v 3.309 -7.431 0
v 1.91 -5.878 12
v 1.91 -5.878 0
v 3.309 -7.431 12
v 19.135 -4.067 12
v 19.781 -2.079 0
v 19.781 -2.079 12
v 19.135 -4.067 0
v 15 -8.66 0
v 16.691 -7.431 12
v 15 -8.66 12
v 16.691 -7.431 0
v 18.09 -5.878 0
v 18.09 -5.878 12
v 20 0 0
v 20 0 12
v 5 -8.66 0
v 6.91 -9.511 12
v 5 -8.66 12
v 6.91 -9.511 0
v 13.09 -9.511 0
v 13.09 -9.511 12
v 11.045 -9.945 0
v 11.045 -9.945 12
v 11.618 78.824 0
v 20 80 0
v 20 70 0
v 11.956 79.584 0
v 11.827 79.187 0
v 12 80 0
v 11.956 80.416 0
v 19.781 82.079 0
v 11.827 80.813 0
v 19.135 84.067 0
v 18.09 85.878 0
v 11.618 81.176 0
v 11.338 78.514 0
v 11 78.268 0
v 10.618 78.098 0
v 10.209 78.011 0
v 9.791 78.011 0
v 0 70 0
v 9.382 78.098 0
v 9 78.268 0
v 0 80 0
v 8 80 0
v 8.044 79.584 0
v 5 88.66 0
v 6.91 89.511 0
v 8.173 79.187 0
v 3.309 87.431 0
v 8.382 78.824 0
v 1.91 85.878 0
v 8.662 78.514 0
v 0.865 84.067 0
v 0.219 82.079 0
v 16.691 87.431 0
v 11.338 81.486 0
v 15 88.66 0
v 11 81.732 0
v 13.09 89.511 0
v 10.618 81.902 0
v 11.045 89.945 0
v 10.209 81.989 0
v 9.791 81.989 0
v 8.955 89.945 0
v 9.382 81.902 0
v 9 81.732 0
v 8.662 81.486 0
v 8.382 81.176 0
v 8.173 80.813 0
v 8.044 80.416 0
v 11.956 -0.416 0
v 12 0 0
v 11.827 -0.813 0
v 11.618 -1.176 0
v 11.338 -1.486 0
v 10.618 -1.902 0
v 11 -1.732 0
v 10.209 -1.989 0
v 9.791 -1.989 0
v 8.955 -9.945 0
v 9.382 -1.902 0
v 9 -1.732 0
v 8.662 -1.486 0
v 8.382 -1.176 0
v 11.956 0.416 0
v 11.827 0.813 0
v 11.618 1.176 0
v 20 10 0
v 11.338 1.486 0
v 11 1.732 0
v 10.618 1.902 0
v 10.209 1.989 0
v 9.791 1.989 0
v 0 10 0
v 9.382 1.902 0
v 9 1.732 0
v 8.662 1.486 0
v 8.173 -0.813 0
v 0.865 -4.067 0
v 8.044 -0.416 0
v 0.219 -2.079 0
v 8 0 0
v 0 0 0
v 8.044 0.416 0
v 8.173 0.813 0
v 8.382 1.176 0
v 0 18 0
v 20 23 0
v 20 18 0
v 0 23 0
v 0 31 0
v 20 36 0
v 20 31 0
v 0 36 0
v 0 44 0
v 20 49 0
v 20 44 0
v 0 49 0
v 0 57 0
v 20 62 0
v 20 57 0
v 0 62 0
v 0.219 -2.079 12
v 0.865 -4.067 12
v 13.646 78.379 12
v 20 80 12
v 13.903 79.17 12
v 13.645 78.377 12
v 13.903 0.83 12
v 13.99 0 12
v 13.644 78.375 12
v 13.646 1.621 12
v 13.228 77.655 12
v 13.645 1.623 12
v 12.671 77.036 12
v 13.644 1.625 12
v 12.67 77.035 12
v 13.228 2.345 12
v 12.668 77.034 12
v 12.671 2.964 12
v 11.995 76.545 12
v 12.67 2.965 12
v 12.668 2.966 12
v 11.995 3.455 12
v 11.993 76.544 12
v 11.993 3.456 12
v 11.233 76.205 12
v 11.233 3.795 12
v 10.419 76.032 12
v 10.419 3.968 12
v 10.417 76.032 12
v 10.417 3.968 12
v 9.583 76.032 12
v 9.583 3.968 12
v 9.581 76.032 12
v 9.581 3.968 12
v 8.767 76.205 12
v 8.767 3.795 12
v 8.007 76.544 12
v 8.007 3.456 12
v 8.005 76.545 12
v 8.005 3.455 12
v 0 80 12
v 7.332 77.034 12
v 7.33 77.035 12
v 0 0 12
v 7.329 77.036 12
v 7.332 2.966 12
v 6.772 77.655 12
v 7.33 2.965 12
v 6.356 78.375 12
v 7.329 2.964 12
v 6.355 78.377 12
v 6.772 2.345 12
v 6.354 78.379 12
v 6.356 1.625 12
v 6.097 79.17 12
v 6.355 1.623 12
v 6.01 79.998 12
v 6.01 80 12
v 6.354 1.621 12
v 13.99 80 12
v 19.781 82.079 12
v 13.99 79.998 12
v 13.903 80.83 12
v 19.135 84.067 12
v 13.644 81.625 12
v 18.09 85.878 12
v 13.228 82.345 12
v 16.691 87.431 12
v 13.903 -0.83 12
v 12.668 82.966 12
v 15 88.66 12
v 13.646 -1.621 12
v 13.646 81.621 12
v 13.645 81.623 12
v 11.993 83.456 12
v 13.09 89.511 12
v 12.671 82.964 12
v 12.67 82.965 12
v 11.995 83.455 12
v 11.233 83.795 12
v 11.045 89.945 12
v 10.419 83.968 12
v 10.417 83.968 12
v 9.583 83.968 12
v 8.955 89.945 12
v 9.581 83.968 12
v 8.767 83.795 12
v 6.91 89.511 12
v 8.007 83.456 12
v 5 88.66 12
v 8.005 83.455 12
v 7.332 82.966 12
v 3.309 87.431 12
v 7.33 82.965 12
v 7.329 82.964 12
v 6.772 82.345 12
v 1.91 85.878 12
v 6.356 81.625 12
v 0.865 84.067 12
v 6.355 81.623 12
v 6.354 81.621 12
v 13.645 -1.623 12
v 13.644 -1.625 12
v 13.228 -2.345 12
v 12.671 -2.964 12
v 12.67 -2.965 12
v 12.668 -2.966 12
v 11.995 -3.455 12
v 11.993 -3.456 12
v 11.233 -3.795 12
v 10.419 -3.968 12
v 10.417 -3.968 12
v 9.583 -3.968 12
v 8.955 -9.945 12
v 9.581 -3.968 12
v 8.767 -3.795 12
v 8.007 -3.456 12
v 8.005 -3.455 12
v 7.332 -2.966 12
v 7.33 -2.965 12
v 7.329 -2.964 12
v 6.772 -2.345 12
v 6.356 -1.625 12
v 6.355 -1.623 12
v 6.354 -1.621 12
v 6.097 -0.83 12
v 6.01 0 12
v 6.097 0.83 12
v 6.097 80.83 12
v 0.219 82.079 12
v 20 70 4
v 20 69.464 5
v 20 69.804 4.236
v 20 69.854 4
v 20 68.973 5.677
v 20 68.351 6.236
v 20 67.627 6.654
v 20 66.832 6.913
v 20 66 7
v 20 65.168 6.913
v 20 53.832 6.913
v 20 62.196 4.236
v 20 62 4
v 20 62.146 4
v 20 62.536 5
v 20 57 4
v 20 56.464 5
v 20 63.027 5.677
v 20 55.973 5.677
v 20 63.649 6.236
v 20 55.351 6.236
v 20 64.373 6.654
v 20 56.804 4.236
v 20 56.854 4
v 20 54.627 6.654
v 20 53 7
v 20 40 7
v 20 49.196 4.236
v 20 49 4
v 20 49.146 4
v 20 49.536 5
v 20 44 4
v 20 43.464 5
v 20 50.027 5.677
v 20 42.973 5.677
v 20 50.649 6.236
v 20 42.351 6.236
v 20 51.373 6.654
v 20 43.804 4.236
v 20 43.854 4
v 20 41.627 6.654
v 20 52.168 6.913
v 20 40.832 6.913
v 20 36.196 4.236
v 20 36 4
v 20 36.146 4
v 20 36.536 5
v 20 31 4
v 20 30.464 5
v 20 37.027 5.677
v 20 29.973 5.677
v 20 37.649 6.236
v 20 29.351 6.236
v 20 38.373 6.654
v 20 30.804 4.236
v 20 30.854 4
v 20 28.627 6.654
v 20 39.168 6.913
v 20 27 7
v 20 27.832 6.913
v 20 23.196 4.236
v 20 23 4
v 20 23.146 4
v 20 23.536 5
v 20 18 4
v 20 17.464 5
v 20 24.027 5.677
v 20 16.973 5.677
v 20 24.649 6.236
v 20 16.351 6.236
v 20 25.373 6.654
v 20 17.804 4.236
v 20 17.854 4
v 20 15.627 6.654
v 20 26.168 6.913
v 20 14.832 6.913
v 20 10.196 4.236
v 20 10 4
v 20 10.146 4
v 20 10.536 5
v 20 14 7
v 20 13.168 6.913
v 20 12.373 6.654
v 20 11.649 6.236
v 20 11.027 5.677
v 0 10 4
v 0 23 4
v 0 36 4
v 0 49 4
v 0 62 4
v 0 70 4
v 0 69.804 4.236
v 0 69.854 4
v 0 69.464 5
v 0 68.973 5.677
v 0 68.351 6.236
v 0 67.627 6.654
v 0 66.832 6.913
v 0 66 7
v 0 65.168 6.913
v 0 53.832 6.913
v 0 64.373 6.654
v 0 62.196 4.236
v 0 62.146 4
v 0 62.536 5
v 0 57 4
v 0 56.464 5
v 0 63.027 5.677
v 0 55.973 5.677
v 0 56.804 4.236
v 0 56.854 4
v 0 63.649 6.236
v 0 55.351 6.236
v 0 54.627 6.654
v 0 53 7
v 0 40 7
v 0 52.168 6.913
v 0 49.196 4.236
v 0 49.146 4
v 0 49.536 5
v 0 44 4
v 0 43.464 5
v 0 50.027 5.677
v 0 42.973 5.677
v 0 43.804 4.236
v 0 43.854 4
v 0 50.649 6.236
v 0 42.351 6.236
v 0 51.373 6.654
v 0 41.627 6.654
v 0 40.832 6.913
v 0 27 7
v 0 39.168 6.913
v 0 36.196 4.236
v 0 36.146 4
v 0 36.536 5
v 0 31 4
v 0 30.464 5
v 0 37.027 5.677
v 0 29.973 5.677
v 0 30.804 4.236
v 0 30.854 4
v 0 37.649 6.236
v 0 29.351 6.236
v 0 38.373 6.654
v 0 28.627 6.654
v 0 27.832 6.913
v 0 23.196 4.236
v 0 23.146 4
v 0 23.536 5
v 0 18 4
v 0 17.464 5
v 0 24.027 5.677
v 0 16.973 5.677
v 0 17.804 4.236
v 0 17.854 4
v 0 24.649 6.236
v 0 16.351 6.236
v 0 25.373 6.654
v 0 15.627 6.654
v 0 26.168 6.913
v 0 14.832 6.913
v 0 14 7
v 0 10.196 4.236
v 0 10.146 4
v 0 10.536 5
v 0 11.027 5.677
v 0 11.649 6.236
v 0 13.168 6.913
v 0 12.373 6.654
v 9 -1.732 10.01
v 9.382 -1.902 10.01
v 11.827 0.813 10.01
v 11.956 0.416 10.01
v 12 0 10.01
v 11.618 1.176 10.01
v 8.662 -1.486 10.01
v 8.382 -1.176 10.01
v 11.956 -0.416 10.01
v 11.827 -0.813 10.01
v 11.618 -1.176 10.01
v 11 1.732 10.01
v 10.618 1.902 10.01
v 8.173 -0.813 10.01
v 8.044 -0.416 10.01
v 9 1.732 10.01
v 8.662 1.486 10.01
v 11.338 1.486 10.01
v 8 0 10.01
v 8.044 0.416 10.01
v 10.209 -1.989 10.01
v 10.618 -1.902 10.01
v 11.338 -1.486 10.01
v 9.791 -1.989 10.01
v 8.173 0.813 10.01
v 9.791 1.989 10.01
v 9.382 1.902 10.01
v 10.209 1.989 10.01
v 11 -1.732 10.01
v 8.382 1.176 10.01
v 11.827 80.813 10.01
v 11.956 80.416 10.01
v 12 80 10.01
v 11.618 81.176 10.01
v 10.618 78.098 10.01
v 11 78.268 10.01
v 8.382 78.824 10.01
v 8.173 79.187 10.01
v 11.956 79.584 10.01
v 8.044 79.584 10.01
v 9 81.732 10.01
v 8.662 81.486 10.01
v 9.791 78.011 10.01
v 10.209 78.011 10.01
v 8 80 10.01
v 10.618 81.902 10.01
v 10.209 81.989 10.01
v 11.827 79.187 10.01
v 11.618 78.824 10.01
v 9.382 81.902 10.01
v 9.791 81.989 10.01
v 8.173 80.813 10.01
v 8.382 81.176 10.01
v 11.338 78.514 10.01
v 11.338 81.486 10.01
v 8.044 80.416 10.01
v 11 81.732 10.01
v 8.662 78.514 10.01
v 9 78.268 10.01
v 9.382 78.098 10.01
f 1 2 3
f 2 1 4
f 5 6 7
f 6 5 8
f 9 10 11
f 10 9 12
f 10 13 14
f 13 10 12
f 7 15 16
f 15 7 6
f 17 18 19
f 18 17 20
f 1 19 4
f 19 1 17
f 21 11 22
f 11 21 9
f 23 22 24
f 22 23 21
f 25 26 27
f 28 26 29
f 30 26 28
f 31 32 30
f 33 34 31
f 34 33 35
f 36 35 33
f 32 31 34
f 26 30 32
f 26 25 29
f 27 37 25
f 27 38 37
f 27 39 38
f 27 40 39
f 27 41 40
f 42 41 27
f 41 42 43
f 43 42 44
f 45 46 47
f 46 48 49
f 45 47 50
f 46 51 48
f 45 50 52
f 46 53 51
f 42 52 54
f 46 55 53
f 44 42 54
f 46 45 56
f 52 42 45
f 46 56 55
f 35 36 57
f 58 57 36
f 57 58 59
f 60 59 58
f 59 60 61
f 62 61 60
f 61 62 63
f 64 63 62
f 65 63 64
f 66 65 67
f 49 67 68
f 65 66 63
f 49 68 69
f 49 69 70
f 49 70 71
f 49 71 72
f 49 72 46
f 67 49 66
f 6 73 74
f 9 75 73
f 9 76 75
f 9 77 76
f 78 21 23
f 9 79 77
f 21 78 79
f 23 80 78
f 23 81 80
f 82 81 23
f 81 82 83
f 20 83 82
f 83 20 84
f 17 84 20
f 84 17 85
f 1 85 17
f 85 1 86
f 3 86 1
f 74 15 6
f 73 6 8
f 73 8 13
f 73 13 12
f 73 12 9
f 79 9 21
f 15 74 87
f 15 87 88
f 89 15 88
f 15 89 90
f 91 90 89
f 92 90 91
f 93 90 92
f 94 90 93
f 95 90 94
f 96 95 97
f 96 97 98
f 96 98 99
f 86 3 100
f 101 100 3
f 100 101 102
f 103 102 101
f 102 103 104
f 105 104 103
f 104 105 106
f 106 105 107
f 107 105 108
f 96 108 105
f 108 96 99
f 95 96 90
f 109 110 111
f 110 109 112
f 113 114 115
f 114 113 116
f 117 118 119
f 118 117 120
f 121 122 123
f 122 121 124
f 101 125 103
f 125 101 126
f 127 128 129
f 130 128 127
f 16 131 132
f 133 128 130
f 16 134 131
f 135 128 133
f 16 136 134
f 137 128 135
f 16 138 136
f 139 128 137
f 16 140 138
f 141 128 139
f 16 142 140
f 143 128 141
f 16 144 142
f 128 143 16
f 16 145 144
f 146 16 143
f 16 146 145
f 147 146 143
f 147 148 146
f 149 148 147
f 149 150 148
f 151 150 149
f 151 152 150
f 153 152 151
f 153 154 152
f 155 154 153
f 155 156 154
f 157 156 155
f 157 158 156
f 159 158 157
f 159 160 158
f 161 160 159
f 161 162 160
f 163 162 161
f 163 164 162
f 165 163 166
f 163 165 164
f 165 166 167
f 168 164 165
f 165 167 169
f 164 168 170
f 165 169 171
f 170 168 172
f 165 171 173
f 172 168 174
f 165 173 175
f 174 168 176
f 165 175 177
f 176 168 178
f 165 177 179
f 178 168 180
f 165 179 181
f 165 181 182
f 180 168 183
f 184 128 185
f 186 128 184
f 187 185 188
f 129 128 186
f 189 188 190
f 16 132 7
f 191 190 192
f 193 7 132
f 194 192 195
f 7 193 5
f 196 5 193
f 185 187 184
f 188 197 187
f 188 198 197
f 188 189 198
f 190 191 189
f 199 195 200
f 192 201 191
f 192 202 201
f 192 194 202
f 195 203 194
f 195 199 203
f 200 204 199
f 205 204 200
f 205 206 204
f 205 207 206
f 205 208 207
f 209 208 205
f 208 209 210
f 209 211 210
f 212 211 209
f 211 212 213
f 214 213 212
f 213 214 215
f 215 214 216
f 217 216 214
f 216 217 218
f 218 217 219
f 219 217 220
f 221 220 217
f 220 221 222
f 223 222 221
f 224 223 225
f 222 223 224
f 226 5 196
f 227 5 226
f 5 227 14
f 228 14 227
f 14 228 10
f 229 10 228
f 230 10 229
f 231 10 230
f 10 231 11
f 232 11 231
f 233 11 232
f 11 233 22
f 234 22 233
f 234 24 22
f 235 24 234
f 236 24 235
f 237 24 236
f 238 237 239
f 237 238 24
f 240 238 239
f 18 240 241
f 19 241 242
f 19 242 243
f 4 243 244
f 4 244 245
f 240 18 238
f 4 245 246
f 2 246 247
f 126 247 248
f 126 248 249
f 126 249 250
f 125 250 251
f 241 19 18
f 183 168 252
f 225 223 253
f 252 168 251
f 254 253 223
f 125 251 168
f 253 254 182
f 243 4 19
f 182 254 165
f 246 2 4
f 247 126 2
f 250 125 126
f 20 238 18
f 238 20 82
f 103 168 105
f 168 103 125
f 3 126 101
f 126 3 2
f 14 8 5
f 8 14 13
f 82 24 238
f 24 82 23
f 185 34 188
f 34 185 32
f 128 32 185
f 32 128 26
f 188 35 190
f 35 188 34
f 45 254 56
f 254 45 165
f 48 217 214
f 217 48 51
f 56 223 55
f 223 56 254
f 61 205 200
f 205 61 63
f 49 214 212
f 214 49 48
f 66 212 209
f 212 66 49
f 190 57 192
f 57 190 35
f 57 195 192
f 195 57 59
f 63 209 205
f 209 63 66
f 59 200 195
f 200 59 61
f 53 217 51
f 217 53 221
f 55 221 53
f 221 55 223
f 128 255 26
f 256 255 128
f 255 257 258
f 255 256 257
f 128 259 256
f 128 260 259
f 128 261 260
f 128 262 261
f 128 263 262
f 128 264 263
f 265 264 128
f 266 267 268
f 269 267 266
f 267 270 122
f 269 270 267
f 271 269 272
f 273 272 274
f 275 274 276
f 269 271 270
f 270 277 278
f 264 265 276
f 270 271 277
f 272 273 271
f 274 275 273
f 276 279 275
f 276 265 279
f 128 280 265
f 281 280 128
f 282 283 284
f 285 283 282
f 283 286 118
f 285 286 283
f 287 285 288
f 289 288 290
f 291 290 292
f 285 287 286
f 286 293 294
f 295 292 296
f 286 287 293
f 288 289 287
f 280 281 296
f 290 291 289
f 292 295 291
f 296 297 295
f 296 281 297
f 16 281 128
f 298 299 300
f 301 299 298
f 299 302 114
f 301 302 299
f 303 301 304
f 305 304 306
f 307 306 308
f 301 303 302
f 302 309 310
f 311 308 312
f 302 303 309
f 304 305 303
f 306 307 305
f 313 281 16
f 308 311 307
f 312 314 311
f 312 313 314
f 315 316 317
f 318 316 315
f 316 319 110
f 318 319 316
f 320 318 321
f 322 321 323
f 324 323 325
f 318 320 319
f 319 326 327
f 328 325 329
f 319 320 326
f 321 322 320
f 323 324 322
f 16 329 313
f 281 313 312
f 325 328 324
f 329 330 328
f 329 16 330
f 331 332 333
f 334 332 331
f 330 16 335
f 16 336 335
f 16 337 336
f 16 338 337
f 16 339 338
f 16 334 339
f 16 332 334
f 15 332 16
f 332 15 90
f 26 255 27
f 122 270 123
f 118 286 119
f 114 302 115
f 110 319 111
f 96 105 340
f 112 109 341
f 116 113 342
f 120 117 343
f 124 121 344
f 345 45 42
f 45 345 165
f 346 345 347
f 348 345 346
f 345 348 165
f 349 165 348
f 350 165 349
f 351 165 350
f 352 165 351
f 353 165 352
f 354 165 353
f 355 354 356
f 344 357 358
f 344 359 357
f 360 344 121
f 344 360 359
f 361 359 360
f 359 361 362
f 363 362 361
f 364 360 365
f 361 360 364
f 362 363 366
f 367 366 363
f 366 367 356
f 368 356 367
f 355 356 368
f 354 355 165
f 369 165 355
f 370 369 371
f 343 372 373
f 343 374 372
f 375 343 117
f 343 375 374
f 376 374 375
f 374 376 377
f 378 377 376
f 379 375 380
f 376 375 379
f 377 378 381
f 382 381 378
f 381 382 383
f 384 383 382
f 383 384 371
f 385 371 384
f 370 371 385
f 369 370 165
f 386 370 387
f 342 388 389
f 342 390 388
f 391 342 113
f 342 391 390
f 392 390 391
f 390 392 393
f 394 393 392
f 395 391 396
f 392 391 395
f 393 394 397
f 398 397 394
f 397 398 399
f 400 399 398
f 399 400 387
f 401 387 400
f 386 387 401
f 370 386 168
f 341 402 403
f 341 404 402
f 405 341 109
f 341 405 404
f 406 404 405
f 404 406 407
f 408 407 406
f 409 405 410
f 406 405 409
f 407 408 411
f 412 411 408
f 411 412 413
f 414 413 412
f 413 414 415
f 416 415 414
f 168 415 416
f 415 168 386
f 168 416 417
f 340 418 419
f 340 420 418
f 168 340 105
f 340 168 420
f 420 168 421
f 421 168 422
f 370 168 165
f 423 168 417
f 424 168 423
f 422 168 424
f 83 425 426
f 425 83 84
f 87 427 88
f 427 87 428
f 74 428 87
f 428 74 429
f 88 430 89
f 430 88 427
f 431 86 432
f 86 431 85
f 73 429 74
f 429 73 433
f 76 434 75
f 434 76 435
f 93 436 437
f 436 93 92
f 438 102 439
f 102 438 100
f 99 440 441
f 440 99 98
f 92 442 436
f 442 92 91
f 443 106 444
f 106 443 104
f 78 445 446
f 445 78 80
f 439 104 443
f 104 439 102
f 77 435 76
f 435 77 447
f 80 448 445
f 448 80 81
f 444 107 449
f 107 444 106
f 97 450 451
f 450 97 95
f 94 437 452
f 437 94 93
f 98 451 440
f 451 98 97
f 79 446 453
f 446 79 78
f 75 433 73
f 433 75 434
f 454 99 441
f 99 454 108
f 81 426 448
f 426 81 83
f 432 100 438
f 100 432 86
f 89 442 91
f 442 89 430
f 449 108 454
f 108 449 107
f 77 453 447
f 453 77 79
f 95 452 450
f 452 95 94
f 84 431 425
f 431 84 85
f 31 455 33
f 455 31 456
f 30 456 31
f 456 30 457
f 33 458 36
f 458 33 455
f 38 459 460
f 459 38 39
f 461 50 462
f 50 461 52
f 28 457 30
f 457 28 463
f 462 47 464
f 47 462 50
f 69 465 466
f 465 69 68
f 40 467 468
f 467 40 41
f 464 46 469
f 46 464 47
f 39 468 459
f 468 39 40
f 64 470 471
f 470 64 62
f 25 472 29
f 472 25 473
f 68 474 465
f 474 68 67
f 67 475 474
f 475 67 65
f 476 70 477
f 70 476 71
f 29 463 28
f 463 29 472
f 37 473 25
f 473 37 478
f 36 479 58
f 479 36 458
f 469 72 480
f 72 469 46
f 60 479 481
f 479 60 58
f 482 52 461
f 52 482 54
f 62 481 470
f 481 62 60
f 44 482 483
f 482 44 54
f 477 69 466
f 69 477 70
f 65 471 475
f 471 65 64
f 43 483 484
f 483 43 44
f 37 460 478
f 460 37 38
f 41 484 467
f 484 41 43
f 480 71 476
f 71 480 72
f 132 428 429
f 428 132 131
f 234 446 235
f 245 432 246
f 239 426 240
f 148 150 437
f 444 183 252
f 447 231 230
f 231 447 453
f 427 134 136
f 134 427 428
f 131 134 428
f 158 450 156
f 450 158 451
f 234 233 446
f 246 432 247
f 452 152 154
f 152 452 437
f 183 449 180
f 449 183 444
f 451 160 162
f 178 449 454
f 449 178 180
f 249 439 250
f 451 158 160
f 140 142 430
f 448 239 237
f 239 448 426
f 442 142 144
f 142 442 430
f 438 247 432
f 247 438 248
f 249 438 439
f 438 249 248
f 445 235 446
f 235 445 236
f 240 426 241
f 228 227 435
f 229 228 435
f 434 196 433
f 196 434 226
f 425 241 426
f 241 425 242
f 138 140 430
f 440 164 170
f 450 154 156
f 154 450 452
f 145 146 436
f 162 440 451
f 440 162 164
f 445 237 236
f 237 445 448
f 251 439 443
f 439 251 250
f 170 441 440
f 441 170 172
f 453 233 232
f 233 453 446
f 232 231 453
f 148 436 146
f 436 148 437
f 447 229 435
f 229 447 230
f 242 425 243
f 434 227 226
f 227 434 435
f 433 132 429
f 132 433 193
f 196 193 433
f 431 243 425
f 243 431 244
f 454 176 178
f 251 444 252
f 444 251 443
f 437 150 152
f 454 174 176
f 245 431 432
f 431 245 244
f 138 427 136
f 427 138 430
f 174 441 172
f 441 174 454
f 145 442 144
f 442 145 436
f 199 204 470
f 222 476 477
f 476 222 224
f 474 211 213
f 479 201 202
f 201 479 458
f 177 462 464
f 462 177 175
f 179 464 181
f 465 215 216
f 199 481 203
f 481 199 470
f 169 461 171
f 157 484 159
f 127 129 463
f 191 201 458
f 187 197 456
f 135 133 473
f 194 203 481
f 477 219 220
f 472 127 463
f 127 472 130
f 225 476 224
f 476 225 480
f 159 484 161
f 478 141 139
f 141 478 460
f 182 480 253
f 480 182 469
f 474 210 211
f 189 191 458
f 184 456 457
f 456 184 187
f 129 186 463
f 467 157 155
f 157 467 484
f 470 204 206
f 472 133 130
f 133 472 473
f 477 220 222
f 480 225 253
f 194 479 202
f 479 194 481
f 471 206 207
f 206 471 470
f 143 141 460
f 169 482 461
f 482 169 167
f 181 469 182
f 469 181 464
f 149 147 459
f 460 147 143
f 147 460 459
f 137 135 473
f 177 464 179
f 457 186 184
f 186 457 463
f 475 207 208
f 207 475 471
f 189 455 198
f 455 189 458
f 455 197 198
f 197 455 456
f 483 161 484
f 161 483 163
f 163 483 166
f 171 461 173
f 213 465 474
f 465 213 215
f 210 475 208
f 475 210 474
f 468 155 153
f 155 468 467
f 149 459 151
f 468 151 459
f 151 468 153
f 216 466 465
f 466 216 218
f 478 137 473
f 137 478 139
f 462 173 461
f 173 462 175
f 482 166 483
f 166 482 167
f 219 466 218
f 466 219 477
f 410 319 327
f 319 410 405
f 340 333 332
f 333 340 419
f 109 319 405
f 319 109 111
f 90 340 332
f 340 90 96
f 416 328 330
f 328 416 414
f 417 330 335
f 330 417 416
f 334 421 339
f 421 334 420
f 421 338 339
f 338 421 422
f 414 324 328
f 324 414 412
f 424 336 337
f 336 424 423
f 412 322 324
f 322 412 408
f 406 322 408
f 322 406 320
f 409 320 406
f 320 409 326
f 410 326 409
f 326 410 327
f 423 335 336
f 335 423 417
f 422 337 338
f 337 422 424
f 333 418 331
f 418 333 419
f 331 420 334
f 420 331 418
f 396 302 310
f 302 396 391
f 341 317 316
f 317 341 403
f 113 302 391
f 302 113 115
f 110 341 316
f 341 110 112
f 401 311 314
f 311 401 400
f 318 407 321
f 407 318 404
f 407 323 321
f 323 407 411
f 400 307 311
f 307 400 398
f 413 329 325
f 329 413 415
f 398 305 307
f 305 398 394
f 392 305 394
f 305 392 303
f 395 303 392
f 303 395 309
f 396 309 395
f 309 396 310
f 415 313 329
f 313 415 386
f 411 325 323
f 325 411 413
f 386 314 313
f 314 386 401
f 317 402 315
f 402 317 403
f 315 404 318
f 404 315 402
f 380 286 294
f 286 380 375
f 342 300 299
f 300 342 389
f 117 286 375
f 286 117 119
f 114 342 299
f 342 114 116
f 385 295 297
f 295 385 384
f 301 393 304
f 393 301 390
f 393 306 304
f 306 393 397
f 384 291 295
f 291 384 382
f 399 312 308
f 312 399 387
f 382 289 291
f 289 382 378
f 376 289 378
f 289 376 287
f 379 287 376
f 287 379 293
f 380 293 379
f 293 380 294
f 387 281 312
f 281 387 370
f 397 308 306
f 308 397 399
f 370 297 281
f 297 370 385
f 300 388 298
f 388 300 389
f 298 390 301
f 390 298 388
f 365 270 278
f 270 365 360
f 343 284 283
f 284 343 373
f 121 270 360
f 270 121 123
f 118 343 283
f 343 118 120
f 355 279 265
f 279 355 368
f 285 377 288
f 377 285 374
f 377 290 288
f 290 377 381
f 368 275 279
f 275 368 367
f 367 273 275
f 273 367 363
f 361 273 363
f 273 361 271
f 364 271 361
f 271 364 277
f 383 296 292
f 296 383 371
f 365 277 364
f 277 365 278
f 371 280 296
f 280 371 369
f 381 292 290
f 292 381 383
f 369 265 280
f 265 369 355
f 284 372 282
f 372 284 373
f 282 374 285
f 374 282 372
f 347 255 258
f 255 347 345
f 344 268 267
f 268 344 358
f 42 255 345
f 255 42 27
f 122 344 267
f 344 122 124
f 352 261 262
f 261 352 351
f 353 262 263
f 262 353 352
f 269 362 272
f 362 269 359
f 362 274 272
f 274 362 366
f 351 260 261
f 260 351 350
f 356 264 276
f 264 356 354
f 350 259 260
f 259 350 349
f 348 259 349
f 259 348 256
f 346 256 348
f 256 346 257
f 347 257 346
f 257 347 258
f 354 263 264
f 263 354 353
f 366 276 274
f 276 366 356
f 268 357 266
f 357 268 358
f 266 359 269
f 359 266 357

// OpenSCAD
//Resolution of the curves.(Higher = more polygons and higher load time)
$fn = 30;
//What would you like the width to be?(mm)
widthOfBody     = 20;
//What would you like the height to be?(mm)
heightOfBody    = 12;
//How many slots do you want?(int)
numberOfSlots   = 5;
//How wide should the slots be?(mm)
widthOfSlots    = 8;
//How wide should the screw hole be?(mm)
widthOfScrew    = 4;
//How wide do you want the seperating walls?(mm)
widthOfWalls    = 5;

lengthOfBody    = (widthOfBody) + ( widthOfSlots * numberOfSlots ) + ( widthOfWalls * ( numberOfSlots - 1 ) );
difference(){
    union(){
        cube([widthOfBody, lengthOfBody, heightOfBody]);
        translate([ widthOfBody / 2, 0, 0]){
            cylinder( d = widthOfBody, h = heightOfBody );
            translate([ 0, lengthOfBody, 0]){
                cylinder( d = widthOfBody, h = heightOfBody );
            }
        }
    }
    union(){
        translate([ widthOfBody / 2, 0, -1 ]){
            cylinder( d = widthOfScrew, h = heightOfBody + 2 );
            translate([ 0, lengthOfBody, 0]){
                cylinder( d = widthOfScrew, h = heightOfBody + 2 );
            }
        }
        translate([ widthOfBody / 2, 0, heightOfBody - ( heightOfBody / 6 ) + 0.01]){
            cylinder( d1 = widthOfScrew, d2 = widthOfScrew * 2, h = ( heightOfBody / 6 ) );
            translate([ 0, lengthOfBody, 0]){
                cylinder( d1 = widthOfScrew, d2 = widthOfScrew * 2, h = 2 );
            }
        }
        for( i = [ 1 : numberOfSlots ] ){
            translate([-1, ( ( widthOfBody / 2 ) ) + ( ( i - 1 ) * widthOfWalls ) + ( ( i - 1) * widthOfSlots ),-1]){
                cube( [ 2 + widthOfBody, widthOfSlots, 1 + ( widthOfSlots / 2 ) ] );
                
                translate([0, widthOfSlots / 2, widthOfSlots / 2 ]){
                    rotate( a = [ 0, 90, 0 ] ){
                        cylinder( d = widthOfSlots, h = 2 + widthOfBody );
                    }
                }
            }
        }
    }
}
